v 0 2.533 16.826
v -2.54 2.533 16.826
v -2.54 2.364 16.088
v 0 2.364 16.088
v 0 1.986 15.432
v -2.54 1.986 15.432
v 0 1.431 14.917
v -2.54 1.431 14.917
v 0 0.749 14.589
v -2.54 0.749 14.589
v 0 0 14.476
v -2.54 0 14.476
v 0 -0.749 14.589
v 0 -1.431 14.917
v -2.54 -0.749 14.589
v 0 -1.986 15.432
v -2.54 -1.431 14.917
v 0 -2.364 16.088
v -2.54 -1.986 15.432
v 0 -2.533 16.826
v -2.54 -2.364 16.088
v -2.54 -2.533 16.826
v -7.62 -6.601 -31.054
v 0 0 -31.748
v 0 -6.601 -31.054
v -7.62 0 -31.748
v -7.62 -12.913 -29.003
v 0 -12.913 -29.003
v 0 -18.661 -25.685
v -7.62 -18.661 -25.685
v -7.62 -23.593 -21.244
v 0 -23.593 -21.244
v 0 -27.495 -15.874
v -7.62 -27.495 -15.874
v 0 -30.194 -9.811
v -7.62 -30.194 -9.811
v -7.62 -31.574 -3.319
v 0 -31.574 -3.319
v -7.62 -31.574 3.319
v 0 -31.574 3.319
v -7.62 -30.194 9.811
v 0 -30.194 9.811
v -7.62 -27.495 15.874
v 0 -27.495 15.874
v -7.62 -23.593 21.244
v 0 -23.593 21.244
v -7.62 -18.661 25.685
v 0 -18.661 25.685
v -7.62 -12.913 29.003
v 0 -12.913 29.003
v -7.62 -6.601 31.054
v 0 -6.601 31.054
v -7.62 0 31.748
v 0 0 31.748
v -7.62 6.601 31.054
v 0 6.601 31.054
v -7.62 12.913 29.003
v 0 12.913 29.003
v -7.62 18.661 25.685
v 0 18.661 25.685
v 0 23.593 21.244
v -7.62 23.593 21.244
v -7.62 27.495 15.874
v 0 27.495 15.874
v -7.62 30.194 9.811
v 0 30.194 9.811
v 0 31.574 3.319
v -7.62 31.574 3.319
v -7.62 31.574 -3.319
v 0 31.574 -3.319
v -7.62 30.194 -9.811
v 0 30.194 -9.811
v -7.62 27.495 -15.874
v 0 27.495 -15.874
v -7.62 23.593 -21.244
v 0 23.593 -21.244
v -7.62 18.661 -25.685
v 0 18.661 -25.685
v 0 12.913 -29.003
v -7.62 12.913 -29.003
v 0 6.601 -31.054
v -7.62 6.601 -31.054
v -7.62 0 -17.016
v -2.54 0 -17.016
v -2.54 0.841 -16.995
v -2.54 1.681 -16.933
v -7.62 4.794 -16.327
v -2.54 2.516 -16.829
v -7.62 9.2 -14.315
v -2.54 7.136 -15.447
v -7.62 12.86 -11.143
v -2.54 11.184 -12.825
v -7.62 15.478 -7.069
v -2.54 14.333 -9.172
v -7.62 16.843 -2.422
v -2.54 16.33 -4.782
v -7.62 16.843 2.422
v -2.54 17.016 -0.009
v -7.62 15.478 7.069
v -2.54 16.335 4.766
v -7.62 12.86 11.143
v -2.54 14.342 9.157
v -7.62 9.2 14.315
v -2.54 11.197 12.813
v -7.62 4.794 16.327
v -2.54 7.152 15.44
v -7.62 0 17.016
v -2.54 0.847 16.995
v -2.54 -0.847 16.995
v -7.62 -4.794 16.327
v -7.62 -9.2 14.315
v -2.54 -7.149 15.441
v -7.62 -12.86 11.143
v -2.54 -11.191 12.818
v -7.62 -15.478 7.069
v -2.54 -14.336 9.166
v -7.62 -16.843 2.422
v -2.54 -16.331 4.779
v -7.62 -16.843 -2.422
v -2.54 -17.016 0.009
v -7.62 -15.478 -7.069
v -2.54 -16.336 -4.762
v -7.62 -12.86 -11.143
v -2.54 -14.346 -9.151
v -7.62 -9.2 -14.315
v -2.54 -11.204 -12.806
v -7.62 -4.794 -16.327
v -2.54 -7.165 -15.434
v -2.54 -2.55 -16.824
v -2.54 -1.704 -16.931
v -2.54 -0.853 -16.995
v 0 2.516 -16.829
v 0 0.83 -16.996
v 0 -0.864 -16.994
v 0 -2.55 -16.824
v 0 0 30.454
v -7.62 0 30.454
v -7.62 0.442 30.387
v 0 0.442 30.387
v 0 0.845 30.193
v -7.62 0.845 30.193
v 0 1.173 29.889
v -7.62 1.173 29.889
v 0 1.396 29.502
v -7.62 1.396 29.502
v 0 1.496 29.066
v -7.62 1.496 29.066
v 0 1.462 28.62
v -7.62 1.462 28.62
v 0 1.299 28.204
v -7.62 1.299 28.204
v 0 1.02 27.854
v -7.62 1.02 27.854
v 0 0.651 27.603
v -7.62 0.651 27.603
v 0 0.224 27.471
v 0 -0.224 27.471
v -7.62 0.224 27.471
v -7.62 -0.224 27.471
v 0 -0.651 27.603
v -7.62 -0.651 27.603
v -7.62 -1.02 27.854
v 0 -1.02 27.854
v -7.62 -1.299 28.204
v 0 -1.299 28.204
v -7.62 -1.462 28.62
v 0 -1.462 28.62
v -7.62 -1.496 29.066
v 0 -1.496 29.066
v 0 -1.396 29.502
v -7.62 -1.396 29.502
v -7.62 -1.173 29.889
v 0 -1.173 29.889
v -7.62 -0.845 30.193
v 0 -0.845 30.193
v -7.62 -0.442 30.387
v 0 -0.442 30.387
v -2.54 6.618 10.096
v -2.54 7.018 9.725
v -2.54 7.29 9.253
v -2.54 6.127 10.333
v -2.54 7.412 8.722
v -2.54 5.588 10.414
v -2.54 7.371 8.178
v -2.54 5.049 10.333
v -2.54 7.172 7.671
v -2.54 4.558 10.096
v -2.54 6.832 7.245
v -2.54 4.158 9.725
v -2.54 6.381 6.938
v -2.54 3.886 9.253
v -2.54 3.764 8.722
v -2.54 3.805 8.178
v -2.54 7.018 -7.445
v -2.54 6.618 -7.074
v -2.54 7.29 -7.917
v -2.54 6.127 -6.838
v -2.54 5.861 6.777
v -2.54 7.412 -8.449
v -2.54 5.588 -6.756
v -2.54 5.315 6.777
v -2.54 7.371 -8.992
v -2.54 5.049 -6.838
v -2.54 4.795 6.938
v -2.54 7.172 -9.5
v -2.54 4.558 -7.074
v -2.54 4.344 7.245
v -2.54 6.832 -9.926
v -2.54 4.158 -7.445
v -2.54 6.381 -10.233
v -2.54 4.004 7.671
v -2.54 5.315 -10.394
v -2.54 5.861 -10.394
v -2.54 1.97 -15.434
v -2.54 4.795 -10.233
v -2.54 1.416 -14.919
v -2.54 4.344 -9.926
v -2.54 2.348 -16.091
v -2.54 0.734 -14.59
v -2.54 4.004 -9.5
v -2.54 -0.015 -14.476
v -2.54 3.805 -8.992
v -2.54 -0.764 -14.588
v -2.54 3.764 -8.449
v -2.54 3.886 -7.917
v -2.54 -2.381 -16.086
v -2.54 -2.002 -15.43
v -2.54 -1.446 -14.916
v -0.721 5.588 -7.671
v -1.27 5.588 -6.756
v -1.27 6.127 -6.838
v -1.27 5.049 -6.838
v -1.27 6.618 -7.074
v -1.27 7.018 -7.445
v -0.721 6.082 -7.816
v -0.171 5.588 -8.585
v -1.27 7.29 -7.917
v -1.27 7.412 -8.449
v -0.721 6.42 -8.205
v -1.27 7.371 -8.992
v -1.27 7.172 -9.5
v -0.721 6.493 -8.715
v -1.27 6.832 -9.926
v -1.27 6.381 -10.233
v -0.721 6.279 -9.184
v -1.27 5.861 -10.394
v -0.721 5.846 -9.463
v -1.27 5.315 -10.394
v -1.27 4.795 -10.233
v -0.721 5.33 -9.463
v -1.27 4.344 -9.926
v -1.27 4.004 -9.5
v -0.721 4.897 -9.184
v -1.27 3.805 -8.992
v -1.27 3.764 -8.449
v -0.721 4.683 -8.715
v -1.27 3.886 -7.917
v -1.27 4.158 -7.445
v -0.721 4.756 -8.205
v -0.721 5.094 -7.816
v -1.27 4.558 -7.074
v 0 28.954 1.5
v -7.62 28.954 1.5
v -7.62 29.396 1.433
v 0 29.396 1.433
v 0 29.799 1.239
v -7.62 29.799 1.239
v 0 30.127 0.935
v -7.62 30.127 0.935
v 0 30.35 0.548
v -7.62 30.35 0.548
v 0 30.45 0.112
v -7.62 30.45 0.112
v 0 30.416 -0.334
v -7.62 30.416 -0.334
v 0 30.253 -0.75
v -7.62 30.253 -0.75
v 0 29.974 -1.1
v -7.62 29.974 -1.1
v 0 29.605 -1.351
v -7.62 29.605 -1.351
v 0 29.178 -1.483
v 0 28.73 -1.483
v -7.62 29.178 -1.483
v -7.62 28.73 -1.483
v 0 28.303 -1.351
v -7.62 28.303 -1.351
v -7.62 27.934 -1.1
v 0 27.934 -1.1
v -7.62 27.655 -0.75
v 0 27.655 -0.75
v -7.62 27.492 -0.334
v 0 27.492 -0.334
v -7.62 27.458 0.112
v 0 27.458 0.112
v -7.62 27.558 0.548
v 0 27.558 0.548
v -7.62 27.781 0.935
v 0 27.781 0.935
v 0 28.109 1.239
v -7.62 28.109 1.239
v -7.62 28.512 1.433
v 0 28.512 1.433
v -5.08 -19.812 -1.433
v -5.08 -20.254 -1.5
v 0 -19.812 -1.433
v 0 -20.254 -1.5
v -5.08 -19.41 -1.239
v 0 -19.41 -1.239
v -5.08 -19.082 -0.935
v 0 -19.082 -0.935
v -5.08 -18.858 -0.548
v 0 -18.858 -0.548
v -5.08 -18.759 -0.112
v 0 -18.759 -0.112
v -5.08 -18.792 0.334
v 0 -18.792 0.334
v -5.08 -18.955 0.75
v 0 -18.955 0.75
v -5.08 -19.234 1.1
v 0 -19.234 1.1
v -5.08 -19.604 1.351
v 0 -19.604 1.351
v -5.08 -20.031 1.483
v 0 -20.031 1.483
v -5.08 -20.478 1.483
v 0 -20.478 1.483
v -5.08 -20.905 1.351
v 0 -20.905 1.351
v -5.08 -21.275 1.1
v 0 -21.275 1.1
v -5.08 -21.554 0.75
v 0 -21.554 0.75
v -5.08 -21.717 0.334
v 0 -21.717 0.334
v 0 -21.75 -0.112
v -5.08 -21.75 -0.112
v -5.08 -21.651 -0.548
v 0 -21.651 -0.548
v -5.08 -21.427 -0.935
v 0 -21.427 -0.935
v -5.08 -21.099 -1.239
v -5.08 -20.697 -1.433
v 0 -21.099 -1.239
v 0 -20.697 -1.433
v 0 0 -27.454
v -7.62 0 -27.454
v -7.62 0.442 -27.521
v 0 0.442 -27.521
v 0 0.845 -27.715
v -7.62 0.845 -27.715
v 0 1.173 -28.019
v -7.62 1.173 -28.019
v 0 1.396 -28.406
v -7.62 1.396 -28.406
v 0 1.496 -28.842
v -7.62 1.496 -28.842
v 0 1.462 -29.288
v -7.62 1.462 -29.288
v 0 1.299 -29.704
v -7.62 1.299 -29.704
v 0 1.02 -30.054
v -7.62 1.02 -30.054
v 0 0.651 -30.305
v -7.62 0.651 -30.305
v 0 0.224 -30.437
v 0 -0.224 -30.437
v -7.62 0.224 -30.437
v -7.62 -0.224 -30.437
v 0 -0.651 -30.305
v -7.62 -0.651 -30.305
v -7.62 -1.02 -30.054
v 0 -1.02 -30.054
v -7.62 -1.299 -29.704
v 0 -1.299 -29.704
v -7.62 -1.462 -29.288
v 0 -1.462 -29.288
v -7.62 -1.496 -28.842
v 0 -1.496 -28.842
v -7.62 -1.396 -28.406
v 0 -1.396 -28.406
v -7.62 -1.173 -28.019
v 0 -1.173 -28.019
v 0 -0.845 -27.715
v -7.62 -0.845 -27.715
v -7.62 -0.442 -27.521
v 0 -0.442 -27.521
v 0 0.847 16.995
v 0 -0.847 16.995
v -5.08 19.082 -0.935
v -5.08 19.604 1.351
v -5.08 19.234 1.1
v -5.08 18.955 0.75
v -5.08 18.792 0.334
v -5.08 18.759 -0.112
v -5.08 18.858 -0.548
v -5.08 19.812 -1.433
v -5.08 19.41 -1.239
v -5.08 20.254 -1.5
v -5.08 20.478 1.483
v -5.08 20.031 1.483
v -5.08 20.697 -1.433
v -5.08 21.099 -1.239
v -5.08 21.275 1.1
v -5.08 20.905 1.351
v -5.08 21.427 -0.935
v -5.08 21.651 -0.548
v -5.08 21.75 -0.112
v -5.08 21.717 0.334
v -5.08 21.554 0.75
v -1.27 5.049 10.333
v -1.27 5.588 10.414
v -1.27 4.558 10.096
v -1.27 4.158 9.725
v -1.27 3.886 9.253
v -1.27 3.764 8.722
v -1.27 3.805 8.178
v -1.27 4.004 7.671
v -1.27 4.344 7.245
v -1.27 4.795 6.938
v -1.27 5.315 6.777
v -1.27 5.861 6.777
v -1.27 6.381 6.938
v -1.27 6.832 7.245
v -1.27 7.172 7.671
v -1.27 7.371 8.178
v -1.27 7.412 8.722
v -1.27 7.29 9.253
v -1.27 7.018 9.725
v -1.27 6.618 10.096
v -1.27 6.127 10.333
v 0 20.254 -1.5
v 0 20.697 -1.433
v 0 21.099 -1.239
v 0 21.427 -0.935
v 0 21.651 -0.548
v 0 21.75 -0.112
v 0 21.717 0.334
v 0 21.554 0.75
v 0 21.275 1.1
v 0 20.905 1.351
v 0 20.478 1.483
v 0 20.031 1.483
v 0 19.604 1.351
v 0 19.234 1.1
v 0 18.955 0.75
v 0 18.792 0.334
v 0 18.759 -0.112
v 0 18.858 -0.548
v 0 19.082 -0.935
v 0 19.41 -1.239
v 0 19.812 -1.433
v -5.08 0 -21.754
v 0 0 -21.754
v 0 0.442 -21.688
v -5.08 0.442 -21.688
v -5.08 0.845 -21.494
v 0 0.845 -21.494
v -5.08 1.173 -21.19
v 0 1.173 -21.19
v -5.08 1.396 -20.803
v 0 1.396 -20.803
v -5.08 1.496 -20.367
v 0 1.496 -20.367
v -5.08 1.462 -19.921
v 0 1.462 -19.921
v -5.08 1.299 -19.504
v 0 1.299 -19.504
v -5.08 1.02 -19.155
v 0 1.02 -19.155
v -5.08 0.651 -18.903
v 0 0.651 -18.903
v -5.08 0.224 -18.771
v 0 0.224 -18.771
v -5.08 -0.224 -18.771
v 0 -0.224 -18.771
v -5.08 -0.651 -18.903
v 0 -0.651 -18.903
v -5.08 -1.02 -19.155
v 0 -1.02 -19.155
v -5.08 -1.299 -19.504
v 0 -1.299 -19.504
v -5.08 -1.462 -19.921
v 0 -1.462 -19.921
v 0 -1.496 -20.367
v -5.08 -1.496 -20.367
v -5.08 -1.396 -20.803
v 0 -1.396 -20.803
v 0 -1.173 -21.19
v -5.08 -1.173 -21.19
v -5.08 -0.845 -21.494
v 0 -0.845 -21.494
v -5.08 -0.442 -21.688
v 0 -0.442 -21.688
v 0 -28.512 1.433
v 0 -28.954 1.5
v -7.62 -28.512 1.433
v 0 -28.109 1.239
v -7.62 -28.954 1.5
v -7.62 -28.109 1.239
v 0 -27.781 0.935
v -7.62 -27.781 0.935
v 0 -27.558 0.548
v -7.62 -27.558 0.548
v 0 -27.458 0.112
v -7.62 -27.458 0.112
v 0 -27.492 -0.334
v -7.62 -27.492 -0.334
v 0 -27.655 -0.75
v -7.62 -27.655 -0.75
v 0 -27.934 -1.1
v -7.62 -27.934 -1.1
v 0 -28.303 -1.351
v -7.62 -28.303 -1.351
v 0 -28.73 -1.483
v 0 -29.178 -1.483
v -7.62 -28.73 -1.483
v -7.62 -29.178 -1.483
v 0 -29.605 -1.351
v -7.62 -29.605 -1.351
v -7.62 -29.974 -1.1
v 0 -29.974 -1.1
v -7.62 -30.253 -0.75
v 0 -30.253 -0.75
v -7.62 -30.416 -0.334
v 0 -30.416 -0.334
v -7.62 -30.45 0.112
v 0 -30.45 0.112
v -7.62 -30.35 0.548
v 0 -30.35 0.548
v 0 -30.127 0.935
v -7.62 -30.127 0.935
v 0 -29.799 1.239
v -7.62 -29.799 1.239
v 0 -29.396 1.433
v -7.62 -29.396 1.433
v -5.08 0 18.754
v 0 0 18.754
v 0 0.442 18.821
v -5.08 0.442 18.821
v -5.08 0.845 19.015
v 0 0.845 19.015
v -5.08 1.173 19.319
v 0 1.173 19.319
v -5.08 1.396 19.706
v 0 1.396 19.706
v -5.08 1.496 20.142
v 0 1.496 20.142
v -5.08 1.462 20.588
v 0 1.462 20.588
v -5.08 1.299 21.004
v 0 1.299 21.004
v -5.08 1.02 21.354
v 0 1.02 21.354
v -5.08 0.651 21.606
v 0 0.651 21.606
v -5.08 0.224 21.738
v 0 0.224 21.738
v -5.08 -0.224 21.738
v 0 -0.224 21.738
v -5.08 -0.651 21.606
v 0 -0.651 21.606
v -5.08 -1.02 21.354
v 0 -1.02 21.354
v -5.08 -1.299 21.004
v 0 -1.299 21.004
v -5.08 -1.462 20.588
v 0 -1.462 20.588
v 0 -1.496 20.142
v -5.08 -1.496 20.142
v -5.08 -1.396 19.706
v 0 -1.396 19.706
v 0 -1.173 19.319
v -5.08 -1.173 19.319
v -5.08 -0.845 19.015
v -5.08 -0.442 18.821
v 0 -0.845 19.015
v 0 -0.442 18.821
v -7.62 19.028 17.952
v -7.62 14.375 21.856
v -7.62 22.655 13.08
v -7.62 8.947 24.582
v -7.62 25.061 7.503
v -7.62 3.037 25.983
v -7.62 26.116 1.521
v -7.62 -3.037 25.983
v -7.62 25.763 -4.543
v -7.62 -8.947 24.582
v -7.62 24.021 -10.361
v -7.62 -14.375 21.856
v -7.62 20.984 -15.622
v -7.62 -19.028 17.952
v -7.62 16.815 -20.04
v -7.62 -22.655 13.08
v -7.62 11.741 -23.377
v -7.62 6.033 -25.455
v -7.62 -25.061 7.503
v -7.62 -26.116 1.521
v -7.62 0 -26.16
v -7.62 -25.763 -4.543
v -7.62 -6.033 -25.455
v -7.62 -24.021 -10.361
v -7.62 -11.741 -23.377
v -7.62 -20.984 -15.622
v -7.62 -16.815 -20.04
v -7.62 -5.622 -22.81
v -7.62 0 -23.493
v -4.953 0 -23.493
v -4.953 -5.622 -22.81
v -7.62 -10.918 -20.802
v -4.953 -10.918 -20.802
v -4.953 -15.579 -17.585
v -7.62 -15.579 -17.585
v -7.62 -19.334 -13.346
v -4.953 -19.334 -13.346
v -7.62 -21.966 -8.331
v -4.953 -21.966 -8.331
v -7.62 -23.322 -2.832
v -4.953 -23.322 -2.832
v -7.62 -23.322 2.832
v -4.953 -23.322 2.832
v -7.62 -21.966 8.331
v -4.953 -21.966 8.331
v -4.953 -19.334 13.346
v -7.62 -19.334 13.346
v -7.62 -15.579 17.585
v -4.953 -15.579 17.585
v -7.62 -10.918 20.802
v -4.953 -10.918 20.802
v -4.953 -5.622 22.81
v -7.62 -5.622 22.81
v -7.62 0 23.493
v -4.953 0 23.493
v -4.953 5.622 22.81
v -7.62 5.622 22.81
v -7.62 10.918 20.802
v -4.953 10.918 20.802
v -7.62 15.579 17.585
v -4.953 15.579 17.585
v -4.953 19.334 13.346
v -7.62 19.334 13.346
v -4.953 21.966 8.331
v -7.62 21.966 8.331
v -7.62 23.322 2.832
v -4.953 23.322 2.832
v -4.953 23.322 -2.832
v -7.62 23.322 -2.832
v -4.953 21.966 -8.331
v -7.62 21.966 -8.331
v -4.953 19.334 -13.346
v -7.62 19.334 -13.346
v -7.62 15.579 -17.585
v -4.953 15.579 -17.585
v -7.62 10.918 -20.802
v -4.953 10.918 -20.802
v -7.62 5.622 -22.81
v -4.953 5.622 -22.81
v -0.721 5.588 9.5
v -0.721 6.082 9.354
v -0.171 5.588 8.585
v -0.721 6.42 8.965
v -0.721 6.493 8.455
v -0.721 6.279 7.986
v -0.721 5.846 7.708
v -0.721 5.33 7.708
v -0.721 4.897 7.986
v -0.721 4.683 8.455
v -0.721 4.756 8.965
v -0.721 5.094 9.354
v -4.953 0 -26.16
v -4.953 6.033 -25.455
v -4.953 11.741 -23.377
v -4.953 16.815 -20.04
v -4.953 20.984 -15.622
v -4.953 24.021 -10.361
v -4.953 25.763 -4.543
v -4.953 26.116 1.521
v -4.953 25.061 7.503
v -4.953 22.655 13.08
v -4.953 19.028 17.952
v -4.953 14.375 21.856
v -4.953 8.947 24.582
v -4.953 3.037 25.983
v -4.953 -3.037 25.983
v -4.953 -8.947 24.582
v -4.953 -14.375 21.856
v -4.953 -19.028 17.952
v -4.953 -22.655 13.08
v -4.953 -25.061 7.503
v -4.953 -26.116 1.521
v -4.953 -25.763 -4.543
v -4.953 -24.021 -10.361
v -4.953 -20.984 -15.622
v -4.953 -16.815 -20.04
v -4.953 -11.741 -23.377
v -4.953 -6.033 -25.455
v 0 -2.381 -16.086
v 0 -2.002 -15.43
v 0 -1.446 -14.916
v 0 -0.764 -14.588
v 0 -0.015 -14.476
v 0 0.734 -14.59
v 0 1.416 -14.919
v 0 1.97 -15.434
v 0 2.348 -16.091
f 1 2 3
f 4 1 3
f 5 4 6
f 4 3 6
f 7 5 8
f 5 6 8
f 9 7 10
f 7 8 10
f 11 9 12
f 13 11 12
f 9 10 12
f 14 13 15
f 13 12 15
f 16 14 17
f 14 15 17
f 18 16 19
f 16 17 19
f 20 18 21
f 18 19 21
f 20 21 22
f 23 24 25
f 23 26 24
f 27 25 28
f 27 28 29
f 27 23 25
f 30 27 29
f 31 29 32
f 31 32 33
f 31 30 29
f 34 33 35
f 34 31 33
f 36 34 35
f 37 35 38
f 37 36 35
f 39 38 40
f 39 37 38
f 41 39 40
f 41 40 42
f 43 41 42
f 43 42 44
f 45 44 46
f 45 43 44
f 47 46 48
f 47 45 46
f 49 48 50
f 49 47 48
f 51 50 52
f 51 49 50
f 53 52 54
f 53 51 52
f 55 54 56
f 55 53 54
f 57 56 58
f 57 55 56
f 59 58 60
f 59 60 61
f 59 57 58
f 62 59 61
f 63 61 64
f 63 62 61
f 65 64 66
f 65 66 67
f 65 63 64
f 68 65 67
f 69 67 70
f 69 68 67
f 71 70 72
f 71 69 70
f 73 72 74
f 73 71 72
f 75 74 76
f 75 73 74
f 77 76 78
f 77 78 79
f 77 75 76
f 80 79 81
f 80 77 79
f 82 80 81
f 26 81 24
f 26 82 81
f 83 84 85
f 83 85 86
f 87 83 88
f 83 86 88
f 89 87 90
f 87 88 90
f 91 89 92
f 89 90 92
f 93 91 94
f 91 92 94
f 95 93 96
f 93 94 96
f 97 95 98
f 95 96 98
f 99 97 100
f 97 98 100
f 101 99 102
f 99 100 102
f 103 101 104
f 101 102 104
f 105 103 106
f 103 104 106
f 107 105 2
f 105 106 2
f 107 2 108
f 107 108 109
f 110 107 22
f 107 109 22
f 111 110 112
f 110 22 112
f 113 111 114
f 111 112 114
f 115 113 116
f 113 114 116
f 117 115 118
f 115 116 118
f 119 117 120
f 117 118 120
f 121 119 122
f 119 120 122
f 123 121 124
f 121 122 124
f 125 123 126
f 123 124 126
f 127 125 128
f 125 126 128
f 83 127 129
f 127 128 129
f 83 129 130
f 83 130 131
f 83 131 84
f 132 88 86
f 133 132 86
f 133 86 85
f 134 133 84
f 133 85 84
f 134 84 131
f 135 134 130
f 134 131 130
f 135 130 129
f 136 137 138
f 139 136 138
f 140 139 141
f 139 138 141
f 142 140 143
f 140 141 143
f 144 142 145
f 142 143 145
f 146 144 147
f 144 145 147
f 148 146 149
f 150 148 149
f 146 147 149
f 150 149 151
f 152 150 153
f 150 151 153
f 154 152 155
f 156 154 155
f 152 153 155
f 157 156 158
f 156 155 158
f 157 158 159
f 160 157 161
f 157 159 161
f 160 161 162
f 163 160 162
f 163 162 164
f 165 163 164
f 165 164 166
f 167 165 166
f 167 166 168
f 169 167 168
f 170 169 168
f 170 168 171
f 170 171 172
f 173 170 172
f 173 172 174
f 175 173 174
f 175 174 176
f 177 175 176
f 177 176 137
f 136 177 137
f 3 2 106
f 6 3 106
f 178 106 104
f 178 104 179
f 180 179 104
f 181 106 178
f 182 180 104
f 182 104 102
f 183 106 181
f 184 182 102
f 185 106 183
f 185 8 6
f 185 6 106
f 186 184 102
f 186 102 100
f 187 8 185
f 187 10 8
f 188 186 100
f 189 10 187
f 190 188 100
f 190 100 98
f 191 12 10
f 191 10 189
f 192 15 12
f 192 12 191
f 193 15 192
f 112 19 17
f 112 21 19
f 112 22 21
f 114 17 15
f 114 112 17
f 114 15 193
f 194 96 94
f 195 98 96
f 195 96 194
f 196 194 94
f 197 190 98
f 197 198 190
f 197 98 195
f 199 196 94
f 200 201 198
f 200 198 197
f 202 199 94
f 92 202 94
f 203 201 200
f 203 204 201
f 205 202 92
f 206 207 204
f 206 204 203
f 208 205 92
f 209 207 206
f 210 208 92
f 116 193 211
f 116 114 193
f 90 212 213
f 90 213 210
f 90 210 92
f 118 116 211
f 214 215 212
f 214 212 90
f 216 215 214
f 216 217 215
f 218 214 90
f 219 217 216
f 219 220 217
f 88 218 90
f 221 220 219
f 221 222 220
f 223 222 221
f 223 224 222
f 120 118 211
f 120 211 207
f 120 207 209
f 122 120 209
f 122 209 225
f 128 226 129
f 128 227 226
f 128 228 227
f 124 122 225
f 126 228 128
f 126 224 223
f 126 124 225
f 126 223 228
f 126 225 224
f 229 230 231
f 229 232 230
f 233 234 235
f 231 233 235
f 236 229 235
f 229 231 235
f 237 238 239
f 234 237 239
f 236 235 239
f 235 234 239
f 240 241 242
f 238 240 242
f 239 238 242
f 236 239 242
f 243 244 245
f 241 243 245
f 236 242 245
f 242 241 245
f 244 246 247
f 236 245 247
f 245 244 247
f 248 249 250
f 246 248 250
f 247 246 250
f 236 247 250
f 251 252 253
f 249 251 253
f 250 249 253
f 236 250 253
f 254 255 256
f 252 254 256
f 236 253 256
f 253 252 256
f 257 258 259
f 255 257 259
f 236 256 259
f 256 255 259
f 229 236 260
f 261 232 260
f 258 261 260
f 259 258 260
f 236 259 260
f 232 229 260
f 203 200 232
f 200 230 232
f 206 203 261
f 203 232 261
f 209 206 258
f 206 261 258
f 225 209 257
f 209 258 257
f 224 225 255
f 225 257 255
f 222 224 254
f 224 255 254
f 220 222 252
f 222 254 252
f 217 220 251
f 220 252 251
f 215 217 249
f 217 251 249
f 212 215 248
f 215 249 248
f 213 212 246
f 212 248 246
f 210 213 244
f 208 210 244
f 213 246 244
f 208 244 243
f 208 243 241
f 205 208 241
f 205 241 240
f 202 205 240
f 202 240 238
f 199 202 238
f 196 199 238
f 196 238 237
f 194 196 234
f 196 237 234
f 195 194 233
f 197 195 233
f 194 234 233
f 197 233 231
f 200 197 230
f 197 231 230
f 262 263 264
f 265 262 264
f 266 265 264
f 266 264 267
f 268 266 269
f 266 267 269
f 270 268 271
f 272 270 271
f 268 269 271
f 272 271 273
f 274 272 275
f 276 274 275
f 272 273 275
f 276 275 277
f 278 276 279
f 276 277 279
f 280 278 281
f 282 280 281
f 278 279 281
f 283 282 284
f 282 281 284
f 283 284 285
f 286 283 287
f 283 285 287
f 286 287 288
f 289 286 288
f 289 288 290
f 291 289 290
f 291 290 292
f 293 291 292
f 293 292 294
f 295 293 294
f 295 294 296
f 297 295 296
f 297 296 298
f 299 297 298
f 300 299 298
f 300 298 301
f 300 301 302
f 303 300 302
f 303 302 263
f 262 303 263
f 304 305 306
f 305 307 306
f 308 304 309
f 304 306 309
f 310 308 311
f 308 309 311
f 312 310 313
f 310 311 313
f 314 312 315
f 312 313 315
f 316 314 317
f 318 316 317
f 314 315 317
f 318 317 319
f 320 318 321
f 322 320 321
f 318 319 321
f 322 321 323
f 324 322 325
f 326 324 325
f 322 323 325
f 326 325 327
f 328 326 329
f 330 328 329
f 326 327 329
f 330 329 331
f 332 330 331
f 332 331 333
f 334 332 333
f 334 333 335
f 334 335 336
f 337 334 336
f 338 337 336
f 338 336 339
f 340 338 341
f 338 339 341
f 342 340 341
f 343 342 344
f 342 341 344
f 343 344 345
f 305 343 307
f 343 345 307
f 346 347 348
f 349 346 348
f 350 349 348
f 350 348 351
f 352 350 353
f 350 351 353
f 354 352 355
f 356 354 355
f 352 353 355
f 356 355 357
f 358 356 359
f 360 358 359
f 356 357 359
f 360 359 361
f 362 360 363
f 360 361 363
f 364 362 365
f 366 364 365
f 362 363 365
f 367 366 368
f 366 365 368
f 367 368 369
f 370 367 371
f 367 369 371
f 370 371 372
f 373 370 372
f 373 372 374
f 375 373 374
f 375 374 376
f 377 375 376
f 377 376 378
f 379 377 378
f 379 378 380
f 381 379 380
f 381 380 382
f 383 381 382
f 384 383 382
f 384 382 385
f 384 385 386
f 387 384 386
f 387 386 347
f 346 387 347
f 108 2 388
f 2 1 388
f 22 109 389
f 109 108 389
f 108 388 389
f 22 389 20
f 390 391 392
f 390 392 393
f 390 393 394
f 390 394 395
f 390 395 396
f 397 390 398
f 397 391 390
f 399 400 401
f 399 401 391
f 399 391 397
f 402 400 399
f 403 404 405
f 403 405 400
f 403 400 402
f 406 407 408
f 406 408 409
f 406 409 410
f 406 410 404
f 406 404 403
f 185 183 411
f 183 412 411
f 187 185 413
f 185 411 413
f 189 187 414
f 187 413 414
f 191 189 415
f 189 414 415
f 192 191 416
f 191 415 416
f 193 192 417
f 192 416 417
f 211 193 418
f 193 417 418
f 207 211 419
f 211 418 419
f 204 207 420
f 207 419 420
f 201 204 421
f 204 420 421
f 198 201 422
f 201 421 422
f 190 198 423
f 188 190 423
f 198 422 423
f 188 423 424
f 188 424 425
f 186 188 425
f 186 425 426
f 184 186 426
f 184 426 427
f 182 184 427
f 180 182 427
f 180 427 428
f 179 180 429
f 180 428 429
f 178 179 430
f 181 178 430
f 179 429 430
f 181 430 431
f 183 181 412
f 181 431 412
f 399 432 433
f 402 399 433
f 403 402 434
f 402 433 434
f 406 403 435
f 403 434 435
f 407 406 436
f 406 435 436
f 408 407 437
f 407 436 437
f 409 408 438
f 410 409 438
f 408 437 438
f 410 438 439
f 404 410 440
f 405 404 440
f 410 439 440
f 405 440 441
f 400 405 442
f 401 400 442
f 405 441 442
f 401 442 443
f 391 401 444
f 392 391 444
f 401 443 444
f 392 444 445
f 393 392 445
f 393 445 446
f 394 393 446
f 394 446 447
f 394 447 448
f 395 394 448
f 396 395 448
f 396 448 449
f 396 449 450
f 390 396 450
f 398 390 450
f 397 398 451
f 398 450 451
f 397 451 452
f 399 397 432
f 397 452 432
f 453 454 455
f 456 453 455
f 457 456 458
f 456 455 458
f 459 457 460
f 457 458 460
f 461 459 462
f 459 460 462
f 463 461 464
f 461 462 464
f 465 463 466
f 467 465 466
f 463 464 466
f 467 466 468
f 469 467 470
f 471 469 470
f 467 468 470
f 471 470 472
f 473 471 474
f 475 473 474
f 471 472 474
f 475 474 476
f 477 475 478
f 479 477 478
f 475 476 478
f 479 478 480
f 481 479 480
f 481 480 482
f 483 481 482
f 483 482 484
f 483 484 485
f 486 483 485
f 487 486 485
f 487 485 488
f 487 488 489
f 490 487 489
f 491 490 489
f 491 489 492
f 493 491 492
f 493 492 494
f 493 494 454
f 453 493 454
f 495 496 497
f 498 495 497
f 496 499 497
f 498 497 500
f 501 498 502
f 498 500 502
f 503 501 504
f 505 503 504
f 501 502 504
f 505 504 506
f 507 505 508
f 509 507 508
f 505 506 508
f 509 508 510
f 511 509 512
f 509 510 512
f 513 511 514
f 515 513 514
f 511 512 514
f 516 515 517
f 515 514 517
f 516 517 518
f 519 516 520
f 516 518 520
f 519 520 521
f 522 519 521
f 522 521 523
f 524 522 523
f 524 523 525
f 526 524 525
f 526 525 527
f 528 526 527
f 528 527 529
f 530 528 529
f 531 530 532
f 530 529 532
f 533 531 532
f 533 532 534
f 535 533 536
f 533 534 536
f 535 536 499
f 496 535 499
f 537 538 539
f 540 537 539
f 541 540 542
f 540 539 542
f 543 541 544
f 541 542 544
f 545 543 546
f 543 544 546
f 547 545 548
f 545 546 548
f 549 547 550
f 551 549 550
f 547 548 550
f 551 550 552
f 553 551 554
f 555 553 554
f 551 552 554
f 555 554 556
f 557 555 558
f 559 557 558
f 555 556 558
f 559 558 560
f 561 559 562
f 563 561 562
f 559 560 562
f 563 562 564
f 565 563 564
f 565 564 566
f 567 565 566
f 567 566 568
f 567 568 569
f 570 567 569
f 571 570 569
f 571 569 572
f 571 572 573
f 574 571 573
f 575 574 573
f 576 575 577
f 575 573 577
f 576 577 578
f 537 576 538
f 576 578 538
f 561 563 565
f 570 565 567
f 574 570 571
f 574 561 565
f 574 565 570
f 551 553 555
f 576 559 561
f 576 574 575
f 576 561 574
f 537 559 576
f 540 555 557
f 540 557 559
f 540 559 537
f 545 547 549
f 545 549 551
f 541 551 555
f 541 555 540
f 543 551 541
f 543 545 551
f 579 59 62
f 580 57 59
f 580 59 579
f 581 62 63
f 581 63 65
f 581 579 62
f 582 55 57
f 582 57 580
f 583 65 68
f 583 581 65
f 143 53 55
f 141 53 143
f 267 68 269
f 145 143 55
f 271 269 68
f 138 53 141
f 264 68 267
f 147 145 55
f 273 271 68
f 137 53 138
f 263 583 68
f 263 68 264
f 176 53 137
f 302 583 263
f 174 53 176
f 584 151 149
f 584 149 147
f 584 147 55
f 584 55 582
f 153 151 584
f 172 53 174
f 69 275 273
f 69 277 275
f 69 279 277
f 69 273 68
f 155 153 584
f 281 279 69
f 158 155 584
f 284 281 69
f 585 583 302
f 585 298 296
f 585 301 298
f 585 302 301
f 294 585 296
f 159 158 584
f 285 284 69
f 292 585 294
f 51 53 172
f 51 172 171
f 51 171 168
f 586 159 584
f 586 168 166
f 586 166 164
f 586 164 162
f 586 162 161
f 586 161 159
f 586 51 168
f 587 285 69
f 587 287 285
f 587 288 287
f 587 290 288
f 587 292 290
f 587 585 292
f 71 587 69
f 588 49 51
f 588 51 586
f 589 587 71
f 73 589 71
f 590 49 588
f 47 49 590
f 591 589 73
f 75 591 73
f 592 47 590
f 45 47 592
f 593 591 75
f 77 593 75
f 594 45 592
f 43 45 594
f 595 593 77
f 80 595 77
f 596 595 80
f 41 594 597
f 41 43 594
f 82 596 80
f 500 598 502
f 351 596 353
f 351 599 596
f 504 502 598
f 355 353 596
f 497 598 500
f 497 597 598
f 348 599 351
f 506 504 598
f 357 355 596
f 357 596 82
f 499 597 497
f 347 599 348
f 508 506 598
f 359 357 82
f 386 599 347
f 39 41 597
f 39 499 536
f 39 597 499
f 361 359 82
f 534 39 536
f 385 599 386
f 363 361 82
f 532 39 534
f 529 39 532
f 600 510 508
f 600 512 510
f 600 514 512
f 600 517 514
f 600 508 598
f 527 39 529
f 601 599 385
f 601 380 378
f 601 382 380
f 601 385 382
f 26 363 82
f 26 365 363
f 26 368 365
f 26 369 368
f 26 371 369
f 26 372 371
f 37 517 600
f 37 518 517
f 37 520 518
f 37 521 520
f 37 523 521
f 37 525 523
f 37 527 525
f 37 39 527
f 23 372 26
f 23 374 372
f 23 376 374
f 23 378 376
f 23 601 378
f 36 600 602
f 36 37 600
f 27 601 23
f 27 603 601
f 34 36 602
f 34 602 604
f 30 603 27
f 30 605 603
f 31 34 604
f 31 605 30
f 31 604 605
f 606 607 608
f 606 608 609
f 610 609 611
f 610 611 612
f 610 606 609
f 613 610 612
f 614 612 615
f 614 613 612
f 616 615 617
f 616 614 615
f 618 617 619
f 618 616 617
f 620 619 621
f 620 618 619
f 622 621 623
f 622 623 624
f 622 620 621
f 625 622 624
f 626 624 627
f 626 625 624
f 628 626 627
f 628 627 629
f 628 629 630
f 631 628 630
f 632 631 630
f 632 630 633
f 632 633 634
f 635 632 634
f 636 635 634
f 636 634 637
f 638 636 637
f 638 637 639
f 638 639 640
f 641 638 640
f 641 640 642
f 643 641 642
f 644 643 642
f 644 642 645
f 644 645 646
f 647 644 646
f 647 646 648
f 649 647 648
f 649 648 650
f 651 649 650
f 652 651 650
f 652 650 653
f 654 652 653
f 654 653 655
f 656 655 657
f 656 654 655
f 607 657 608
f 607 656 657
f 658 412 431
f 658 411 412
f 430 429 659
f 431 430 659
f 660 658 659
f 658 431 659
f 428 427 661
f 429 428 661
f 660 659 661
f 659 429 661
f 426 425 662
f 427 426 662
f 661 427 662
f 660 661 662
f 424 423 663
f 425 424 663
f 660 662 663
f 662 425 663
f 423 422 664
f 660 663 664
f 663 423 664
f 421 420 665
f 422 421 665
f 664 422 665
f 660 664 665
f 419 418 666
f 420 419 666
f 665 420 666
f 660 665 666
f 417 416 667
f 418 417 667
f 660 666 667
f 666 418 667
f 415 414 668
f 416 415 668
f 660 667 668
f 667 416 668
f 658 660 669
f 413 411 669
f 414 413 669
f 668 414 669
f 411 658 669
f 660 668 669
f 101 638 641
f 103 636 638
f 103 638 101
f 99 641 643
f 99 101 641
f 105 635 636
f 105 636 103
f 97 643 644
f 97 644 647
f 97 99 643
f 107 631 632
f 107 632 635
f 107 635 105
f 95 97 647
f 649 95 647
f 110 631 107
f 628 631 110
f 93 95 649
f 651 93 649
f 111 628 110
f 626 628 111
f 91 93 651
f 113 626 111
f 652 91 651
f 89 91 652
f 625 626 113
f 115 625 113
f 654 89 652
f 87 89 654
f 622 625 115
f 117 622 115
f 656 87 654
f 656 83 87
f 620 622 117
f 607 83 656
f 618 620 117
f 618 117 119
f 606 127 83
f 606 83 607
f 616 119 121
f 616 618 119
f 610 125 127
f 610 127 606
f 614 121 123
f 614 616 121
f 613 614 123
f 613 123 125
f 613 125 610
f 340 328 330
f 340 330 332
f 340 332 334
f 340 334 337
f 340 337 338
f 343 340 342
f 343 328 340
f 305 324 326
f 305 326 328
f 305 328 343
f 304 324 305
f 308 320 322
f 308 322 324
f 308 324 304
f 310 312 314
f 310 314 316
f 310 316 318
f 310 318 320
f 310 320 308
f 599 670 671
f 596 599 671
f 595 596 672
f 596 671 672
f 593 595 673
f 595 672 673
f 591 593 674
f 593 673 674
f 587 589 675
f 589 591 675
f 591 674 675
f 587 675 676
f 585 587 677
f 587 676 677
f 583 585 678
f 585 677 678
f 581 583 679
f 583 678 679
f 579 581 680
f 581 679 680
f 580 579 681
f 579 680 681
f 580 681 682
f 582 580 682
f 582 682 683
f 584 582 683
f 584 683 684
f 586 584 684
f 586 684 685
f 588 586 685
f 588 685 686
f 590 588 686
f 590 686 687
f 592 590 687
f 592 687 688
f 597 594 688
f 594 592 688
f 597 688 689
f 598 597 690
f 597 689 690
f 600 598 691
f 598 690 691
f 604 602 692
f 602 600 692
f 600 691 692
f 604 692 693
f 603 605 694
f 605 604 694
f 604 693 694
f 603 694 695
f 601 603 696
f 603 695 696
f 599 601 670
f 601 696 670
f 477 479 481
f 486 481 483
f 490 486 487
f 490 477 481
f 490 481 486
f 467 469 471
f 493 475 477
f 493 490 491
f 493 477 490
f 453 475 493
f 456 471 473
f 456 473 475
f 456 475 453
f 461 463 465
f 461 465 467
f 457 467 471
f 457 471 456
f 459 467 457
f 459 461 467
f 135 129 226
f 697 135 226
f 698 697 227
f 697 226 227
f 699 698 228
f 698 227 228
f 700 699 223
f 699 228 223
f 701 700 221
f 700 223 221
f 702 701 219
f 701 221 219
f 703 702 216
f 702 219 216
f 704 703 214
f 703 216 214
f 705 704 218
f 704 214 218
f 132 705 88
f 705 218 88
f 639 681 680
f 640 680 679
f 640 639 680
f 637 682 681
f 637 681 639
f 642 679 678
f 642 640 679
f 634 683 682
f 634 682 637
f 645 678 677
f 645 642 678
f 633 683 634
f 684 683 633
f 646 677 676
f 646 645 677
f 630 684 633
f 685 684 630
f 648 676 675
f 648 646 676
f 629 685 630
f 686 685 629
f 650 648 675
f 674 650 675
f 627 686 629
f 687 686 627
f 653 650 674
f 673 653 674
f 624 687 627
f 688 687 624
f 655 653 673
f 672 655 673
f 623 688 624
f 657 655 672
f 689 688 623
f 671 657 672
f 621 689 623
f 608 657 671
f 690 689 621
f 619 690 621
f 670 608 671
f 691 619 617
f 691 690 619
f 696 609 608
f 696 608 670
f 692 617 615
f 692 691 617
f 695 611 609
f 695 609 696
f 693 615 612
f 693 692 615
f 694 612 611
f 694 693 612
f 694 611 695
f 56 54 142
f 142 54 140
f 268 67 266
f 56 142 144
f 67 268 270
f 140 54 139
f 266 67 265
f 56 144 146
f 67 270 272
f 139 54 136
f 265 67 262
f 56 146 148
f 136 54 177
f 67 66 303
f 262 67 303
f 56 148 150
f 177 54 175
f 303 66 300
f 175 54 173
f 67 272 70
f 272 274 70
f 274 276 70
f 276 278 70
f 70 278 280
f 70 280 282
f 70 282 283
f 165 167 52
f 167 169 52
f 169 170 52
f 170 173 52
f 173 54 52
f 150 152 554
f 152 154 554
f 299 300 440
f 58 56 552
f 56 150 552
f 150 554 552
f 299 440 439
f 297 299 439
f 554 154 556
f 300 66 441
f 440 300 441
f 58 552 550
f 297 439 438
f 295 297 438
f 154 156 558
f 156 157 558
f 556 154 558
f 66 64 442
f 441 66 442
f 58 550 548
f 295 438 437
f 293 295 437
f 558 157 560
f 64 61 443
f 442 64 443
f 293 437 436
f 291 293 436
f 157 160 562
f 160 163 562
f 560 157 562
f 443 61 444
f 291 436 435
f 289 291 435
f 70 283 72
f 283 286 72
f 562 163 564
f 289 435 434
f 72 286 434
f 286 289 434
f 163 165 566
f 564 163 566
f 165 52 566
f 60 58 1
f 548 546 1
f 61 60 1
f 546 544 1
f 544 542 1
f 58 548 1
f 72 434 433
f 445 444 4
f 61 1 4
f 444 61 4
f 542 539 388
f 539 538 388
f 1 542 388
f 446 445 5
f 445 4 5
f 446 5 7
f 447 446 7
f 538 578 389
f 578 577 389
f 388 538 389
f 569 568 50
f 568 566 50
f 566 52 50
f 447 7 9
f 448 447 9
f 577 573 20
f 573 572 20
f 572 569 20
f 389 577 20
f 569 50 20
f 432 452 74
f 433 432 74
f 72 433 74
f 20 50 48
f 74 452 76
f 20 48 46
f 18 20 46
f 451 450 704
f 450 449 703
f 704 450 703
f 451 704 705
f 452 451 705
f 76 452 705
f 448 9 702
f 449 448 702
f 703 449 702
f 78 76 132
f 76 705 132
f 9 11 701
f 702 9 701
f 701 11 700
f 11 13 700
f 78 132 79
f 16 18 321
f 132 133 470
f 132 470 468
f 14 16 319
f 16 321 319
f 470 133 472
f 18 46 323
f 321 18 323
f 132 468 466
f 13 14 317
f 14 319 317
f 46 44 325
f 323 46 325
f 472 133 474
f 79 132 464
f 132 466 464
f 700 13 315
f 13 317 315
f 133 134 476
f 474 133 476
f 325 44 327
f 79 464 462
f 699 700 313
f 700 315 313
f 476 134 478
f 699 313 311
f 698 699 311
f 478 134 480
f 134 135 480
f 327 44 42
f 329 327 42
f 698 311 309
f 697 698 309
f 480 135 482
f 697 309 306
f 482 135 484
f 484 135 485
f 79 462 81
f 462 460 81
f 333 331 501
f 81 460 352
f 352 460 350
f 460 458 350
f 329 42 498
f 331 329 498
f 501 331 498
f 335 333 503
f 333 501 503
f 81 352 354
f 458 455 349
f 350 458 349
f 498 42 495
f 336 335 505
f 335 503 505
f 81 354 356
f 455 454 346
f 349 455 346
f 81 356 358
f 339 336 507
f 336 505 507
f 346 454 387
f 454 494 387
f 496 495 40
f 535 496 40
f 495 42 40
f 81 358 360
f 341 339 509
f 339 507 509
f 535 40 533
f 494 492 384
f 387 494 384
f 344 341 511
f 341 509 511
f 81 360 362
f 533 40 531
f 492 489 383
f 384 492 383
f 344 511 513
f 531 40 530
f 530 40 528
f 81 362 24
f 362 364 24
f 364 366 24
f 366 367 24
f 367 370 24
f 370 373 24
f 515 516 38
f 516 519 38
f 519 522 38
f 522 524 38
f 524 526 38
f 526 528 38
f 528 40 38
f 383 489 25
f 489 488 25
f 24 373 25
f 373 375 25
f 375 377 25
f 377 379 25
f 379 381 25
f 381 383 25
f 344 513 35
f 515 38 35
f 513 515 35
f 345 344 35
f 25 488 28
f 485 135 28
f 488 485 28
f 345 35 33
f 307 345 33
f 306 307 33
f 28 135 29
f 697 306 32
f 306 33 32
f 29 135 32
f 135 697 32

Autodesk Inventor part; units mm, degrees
ref_plane "YZ Plane" through (0, 0, 0) normal (1, 0, 0) x (0, 1, 0)
ref_plane "XZ Plane" through (0, 0, 0) normal (0, 1, 0) x (-1, 0, 0)
ref_plane "XY Plane" through (0, 0, 0) normal (0, 0, 1) x (1, 0, 0)
sketch "Sketch1" plane through (0, 0, 0) normal (0, 1, 0) x (-1, 0, 0)
  line L0 (0, 0) -> (0, -31.748)
  line L1 (0, -31.748) -> (7.62, -31.748)
  line L2 (7.62, -31.748) -> (7.62, -26.16)
  line L3 (7.62, -26.16) -> (4.953, -26.16)
  line L4 (4.953, -26.16) -> (4.953, -23.493)
  line L5 (4.953, -23.493) -> (7.62, -23.493)
  line L6 (7.62, -23.493) -> (7.62, -17.016)
  line L7 (7.62, -17.016) -> (2.54, -17.016)
  line L8 (2.54, -17.016) -> (2.54, 0)
  line L9 (0, 0) -> (2.54, 0)
  dimension "d0" = 31.748
  dimension "d1" = 7.62
  dimension "d2" = 5.588
  dimension "d3" = 2.667
  dimension "d4" = 2.667
  dimension "d5" = 6.477
  dimension "d6" = 5.08
  dimension "d7" = 2.54
revolve "Revolution1" add sketch "Sketch1" angle 360 about axis through (0, 0, 0) along (-1, 0, 0)
sketch "Sketch2" plane through (-7.62, 0, 0) normal (-1, 0, 0) x (0, 0, 1)
  circle A0 centre (28.954, 0) radius 1.5
  circle A1 centre (0, 0) radius 31.748 projected
  line L0 (31.748, 0) -> (26.16, 0)
  circle A2 centre (0, 0) radius 26.16 projected
  circle A3 centre (0, 28.954) radius 1.5
  circle A4 centre (-28.954, 0) radius 1.5
  circle A5 centre (0, -28.954) radius 1.5
  dimension "d9" = 3
  dimension "d12" = 360
extrude "Extrusion1" cut sketch "Sketch2" against normal blind 12.7 contours L0 A0 | A0 L0 | A3 | A4 | A5
sketch "Sketch3" plane through (0, 0, 0) normal (1, 0, 0) x (0, 0, -1)
  circle A0 centre (0, 0) radius 23.493 projected
  circle A1 centre (0, 0) radius 20.2545
  circle A2 centre (20.2545, 0) radius 1.5
  circle A3 centre (0, 20.2545) radius 1.5
  circle A4 centre (-20.2545, 0) radius 1.5
  circle A5 centre (0, -20.2545) radius 1.5
  dimension "d17" = 3.2385
  dimension "d18" = 3
  dimension "d21" = 360
sketch "Sketch4" plane through (-7.62, 0, 0) normal (-1, 0, 0) x (0, 0, 1)
  circle A0 centre (0, 0) radius 17.016 projected
  circle A1 centre (0, 0) radius 23.493 projected
  dimension "d16" = 6.477
extrude "Extrusion2" cut sketch "Sketch3" against normal blind 5.08 contours A1 A2 | A1 A2 | A3 A1 | A1 A3 | A5 A1 | A1 A5 | A4 A1 | A1 A4
sketch "Sketch5" plane through (-2.54, 0, 0) normal (-1, 0, 0) x (0, 0, 1)
  circle A0 centre (0, 0) radius 17.016 projected
  line L0 (-17.016, 0) -> (17.016, 0)
  line L1 (-14.478, -9.9949) -> (14.478, -9.9949)
  line L2 (-14.478, 9.9949) -> (14.478, 9.9949)
  line L3 (14.478, 9.9949) -> (14.478, -9.9949)
  line L4 (-14.478, 9.9949) -> (-14.478, -9.9949)
  arc A1 (16.8267, -2.5309) -> (16.8267, 2.5309) centre (0, 0) ccw
  point P0 (0, 9.9949)
  point P1 (14.478, 0)
  dimension "d25" = 28.956
  dimension "d26" = 19.9898
sketch "Sketch6" plane through (-7.62, 0, 0) normal (-1, 0, 0) x (0, 0, 1)
  circle A0 centre (0, 0) radius 17.016 projected
  circle A1 centre (17.016, 0) radius 2.54
  arc A2 (16.8264, -2.5329) -> (16.8264, 2.5329) centre (0, 0) ccw
  circle A3 centre (-17.016, -0.0173) radius 2.54
  arc A4 (-16.829, 2.5158) -> (-16.8238, -2.55) centre (0, 0) ccw
  dimension "d27" = 5.08
  dimension "d28" = 5.08
extrude "Extrusion3" cut sketch "Sketch6" against normal blind 12.7 contours A0 A1 | A3 A0 picked at (16.1885, -0.4913) picked at (-16.1553, -0.0173)
sketch "Sketch7" plane through (-2.54, 0, 17.016) normal (-1, 0, 0) x (0, 0, 1)
  arc A0 (-33.8398, -2.55) -> (-33.8449, 2.5158) centre (-34.0319, -0.0173) ccw projected
  line L0 (-31.4919, -0.0173) -> (-2.4894, -0.0173) construction
  line L1 (-25.6012, 5.588) -> (-8.4308, 5.588)
  point P0 (-17.016, 0)
  point P1 (-17.016, 5.588)
  dimension "d34" = 5.588
hole "Hole1" at (-2.54, 5.588, -8.5852) at (-2.54, 5.588, 8.5852) direction (1, 0, 0) diameter 3.6576 depth 1.27 tip angle 118
equation "\"d28\" = d27"
properties part number "LED holder 2"
